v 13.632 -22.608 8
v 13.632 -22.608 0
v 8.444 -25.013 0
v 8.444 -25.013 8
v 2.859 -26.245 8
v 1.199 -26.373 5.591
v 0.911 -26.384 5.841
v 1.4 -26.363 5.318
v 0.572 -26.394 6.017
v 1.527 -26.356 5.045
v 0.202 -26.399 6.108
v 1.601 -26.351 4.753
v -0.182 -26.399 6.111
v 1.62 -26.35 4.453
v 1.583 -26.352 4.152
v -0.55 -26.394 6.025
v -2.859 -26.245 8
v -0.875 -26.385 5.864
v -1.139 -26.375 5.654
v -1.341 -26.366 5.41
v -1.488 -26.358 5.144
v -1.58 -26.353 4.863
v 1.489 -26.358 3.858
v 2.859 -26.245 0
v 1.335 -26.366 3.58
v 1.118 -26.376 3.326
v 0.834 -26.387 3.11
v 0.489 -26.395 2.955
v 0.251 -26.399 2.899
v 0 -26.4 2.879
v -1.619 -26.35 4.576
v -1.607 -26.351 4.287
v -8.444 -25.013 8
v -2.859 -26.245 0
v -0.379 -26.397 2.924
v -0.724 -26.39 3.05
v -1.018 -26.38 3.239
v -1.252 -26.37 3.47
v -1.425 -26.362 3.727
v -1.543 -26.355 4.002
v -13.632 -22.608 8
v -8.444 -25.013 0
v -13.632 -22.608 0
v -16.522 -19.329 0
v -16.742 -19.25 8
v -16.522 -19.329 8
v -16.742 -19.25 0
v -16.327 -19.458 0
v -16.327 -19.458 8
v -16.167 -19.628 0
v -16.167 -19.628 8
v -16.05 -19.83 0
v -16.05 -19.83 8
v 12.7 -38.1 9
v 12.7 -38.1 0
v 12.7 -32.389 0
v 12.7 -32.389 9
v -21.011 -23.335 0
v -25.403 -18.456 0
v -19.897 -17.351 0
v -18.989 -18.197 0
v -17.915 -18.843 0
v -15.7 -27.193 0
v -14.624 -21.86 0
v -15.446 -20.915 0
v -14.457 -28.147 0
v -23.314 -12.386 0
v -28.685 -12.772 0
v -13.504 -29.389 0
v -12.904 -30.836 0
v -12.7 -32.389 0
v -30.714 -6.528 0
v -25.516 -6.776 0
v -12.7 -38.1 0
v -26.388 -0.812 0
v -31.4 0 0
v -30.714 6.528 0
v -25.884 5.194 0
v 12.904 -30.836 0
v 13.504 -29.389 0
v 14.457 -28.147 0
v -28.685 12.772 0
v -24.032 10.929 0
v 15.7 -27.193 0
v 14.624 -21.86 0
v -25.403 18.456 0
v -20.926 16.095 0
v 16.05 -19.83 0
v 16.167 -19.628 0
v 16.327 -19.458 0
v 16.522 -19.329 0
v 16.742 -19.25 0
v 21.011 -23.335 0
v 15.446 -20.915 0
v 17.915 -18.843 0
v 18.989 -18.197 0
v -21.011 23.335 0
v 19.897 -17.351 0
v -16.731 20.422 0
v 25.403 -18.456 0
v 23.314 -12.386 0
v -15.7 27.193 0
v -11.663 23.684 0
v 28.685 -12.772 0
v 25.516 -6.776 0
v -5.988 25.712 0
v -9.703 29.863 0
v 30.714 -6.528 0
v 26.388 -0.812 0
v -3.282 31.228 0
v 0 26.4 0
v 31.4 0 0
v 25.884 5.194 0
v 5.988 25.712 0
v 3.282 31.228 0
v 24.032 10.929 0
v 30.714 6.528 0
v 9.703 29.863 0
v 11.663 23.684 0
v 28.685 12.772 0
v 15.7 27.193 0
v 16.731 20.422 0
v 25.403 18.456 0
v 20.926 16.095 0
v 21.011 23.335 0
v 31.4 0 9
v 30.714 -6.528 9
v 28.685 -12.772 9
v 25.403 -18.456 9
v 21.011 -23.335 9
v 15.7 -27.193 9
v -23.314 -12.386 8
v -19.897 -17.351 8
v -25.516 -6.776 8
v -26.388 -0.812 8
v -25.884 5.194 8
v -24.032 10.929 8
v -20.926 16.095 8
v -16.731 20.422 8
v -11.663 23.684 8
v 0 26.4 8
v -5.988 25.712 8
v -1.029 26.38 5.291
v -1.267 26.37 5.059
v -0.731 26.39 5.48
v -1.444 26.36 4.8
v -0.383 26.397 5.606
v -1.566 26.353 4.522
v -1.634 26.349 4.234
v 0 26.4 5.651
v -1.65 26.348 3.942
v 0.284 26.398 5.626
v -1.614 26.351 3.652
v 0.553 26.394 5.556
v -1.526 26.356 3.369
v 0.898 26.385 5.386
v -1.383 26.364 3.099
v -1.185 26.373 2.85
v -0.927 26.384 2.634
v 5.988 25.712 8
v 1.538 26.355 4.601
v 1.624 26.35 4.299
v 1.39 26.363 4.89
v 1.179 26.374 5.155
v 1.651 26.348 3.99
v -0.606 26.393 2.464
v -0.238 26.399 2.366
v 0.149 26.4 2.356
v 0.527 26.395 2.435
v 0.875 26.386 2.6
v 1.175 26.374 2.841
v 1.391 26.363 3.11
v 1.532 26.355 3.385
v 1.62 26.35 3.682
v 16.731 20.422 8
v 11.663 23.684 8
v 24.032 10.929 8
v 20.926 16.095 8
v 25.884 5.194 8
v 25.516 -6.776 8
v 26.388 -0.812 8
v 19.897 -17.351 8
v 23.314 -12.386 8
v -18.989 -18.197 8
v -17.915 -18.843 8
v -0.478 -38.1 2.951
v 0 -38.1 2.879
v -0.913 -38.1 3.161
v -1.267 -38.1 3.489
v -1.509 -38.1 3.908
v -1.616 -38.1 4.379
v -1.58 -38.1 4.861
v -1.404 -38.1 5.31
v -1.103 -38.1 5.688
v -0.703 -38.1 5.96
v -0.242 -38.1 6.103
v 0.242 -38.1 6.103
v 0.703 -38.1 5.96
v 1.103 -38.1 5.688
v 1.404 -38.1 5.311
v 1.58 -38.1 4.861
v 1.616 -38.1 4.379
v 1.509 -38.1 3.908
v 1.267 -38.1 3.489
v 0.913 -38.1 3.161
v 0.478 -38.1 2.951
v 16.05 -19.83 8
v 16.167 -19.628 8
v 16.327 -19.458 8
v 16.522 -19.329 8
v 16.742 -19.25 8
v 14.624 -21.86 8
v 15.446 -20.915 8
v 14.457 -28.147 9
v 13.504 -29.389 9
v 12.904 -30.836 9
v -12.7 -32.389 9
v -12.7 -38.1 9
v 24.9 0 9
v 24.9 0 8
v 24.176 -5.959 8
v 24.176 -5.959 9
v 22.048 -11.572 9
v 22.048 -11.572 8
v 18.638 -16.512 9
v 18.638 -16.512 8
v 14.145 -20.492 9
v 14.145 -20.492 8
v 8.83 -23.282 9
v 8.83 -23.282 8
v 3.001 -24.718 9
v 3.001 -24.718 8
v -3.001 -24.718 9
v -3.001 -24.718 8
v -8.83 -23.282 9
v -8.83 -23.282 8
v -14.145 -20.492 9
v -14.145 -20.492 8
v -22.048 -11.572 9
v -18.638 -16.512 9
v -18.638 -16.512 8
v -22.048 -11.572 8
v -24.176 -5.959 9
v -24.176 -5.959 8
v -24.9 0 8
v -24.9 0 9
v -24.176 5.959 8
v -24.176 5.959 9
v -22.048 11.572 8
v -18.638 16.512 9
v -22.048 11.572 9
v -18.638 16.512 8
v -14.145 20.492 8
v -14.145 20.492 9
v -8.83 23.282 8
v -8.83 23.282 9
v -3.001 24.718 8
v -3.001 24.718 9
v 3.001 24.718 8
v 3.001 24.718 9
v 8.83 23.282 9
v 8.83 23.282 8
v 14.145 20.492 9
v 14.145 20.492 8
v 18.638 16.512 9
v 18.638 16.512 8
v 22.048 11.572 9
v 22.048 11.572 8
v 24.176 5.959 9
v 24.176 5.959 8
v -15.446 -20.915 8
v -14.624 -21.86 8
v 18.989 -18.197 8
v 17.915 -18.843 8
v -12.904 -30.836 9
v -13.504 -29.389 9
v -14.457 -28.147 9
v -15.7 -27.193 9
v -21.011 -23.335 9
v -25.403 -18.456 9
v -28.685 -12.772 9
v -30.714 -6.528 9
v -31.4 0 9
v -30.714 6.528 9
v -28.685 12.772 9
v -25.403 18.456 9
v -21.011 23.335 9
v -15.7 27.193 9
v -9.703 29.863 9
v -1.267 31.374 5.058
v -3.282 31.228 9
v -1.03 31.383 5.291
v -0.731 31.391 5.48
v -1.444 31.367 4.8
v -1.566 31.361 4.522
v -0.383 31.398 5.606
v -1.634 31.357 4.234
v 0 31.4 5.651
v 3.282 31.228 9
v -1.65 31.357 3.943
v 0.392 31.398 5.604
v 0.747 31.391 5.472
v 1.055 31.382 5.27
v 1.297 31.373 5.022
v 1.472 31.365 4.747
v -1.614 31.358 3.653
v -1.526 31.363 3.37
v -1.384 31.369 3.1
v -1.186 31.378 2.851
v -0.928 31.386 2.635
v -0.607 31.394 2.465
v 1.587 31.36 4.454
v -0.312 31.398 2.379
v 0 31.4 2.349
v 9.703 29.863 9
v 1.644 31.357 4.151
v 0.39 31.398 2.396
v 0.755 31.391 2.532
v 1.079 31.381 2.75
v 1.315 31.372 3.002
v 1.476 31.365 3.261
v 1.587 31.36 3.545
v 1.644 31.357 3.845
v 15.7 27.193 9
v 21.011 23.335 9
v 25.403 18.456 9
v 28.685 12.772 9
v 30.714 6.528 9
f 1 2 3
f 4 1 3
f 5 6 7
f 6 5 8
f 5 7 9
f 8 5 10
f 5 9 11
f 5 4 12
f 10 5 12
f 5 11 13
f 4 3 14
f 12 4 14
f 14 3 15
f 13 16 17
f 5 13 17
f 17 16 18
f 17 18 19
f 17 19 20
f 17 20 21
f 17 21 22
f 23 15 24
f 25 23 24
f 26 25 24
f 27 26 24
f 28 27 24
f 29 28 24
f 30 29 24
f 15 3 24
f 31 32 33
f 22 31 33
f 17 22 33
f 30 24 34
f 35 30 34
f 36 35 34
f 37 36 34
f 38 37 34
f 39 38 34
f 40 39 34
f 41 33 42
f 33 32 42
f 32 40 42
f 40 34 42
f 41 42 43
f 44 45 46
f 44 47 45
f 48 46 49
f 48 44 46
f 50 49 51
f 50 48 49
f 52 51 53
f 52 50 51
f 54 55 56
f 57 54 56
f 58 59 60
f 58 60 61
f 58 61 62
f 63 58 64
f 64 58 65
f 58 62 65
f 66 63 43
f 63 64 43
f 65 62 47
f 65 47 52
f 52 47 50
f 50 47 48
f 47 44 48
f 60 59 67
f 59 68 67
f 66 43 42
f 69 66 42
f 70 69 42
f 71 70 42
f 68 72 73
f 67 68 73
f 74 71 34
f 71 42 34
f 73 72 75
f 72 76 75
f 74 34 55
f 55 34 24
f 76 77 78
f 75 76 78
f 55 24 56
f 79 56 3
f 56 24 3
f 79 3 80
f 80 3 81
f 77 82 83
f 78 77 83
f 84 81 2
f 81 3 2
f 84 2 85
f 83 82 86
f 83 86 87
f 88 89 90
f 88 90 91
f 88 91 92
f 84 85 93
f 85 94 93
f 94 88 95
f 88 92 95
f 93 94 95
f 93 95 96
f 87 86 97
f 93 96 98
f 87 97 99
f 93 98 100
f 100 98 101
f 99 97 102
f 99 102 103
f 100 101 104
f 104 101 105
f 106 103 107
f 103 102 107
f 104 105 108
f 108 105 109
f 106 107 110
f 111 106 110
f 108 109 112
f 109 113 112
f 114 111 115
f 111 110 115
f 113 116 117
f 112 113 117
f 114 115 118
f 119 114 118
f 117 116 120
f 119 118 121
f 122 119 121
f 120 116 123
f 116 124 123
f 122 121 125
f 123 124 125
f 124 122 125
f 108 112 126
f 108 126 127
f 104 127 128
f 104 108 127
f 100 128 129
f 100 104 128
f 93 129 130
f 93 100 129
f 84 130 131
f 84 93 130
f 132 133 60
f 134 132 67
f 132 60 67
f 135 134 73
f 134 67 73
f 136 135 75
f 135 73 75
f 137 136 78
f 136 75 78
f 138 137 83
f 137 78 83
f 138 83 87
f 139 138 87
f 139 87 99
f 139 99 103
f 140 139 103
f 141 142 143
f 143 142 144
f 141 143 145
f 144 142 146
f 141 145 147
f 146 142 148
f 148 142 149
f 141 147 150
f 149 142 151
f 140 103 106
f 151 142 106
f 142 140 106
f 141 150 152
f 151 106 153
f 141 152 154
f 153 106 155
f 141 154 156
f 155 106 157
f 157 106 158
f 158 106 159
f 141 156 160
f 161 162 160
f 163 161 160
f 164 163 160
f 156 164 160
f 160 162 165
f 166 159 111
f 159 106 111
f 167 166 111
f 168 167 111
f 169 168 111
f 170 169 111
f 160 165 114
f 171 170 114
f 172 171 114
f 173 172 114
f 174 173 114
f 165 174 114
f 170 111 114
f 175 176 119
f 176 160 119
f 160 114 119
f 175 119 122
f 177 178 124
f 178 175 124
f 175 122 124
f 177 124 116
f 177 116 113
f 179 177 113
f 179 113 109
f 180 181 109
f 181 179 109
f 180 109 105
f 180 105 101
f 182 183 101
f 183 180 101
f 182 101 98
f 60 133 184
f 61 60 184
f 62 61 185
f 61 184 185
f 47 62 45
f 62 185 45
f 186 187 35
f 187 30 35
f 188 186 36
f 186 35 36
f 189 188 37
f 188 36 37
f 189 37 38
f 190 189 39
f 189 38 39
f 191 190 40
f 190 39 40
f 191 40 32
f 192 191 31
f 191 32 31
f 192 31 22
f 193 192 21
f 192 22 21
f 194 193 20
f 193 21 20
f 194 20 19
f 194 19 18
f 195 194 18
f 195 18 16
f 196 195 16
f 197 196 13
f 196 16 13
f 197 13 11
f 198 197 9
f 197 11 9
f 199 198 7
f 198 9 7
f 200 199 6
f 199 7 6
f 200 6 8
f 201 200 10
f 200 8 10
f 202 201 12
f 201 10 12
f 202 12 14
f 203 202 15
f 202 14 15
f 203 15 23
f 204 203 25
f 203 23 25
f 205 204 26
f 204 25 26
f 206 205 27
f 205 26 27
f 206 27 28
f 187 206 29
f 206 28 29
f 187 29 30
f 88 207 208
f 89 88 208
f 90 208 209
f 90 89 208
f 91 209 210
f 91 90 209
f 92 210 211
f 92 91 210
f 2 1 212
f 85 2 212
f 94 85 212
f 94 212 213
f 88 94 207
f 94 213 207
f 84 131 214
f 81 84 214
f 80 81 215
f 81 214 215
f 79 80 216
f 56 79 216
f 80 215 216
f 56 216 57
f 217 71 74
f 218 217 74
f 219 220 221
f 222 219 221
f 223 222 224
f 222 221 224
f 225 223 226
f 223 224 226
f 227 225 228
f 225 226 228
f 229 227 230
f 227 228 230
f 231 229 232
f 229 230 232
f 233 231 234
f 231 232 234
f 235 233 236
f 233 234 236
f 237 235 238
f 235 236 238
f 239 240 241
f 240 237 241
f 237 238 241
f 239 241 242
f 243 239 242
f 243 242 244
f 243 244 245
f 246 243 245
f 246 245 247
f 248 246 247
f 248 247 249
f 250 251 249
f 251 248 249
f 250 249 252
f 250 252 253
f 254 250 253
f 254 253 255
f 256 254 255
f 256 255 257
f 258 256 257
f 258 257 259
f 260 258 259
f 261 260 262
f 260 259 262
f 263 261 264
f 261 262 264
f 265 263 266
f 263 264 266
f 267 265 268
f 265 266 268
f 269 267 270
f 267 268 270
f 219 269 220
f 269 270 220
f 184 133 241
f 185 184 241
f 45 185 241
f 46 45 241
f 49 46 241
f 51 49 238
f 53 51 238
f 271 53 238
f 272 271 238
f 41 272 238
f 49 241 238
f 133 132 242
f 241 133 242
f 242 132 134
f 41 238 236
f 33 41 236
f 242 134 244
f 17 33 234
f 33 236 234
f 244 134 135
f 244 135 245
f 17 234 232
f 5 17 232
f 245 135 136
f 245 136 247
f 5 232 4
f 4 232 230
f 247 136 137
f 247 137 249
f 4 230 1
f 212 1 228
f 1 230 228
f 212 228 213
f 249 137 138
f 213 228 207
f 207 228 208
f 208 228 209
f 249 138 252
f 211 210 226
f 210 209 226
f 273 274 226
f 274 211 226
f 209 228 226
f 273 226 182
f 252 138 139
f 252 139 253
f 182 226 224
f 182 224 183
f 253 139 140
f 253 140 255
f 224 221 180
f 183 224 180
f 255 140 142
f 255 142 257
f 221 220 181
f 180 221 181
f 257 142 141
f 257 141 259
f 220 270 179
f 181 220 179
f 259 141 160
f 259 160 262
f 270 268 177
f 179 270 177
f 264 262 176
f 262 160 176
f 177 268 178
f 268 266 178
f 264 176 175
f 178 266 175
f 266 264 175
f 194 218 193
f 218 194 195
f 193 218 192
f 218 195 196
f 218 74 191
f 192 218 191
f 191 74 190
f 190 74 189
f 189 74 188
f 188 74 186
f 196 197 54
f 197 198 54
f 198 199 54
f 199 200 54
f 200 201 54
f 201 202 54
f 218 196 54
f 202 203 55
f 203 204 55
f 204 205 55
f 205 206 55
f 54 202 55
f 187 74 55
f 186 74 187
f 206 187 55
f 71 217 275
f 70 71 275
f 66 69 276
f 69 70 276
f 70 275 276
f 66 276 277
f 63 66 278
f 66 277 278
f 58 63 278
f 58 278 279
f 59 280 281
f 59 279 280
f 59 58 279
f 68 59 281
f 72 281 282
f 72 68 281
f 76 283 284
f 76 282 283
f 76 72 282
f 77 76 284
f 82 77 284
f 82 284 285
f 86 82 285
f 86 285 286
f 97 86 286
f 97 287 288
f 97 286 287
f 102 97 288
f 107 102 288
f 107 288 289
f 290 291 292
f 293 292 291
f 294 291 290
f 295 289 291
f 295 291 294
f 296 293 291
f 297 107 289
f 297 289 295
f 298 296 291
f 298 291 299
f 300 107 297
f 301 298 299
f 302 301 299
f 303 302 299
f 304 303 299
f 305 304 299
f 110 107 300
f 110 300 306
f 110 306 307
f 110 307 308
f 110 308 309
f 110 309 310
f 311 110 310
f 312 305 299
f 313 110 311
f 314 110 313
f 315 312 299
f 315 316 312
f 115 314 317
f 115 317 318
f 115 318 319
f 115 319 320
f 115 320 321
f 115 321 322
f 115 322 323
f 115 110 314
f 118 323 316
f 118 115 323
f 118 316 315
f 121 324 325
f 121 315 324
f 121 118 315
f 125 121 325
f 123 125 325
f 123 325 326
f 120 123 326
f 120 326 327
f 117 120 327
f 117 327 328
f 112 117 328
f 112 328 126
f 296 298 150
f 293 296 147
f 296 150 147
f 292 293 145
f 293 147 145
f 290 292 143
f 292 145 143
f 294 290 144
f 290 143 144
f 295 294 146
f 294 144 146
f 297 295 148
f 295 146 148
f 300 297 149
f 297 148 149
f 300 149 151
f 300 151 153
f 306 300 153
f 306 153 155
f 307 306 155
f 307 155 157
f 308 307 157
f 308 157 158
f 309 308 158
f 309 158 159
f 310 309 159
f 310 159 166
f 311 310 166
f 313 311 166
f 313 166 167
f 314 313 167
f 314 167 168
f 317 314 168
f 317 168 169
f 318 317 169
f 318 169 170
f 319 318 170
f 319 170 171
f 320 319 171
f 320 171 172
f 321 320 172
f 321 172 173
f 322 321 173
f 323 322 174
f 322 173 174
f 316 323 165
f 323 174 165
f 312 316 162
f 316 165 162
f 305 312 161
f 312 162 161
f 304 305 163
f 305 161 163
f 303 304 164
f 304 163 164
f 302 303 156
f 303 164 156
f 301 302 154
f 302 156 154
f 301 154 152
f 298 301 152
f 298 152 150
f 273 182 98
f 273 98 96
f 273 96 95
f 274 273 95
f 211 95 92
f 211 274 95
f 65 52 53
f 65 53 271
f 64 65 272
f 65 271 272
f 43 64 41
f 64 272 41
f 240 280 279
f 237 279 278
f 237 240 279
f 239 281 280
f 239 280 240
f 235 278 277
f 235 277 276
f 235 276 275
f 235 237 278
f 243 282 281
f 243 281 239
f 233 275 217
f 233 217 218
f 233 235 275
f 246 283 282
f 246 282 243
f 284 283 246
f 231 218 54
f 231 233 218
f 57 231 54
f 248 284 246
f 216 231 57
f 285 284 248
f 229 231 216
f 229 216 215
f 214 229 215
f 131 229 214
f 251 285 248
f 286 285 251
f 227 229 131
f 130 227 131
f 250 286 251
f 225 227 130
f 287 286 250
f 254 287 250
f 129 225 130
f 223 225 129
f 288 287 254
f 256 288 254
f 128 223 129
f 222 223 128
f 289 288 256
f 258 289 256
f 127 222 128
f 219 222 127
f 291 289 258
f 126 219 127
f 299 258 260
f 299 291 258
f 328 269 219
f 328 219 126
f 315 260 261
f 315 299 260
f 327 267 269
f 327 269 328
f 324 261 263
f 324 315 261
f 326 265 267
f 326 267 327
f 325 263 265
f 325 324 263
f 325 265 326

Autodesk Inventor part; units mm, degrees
ref_plane "YZ Plane" through (0, 0, 0) normal (1, 0, 0) x (0, 1, 0)
ref_plane "XY Plane" through (0, 0, 0) normal (0, 0, 1) x (1, 0, 0)
sketch "Sketch1" plane through (0, 0, 0) normal (0, 0, 1) x (1, 0, 0)
  circle A0 centre (0, 0) radius 25.4 construction
  circle A1 centre (0, 0) radius 26.4
  circle A2 centre (0, 0) radius 31.4
  line L0 (0, 0) -> (37.8275, -45.0811) construction
  line L1 (0, 0) -> (58.8492, 0) construction
  circle A3 centre (16.9696, -20.2236) radius 1
  line L2 (0, 0) -> (0, -31.4) construction
  circle A4 centre (-16.9696, -20.2236) radius 1
  dimension "d1" = 52.8
  dimension "d2" = 62.8
  dimension "d0" = 50.8
  dimension "d4" = 50
extrude "Extrusion1" add sketch "Sketch1" along normal blind 8 contours A4 A1 | A1 A4 | A3 A1 | A1 A3 | A2
fillet "Fillet1" radius 6 2 edges at (17.7233, -19.5664, 4) (16.1915, -20.8517, 4)
fillet_without_effect "Fillet2"
fillet "Fillet3" radius 6 2 edges at (-17.7233, -19.5664, 4) (-16.1915, -20.8517, 4)
fillet_without_effect "Fillet4"
sketch "Sketch2" plane through (0, 0, 8) normal (0, 0, 1) x (1, 0, 0)
  circle A0 centre (0, 0) radius 31.4 projected
  arc A1 (19.8973, -17.351) -> (-19.8973, -17.351) centre (0, 0) ccw projected
  circle A2 centre (0, 0) radius 24.9
  circle A3 centre (0, 0) radius 31.4
  dimension "d11" = 49.8
extrude "Extrusion2" add sketch "Sketch2" along normal blind 1
ref_plane "Work Plane1" through (0, 31.4, 0) normal (0, 1, 0) x (-1, 0, 0)
sketch "Sketch3" plane through (0, 31.4, 0) normal (0, 1, 0) x (-1, 0, 0)
  line L0 (-31.4, 0) -> (31.4, 0) projected
  point P0 (0, 0)
  point P1 (0, 4)
  dimension "d14" = 4
hole "Hole1" at (0, 31.4, 4) direction (0, -1, 0) diameter 3.302 depth 12.3 tip angle 118 thread size "8-32 UNC" class "2B" standard "ANSI Unified Screw Threads"
sketch "Sketch4" plane through (0, 0, 0) normal (0, 0, -1) x (-1, 0, 0)
  circle A0 centre (0, 0) radius 31.4 projected
  arc A1 (-13.6322, -22.608) -> (13.6322, -22.608) centre (0, 0) ccw projected
  line L0 (-44.084, -38.1) -> (62.353, -38.1) construction
  line L1 (-12.7, -28.7171) -> (12.7, -28.7171)
  line L2 (12.7, -28.7171) -> (12.7, -38.1)
  line L3 (12.7, -38.1) -> (-12.7, -38.1)
  line L4 (-12.7, -38.1) -> (-12.7, -28.7171)
  line L5 (-12.7, -28.7171) -> (12.7, -38.1) construction
  line L6 (12.7, -28.7171) -> (-12.7, -38.1) construction
  line L7 (0, 0) -> (0, -74.2634) construction
  point P0 (0, -33.4085)
  point P1 (0, -33.4085)
  dimension "d22" = 38.1
  dimension "d23" = 25.4
extrude "Extrusion3" add sketch "Sketch4" against normal blind 9 contours L1 A0 | A0 L2 L3 L4 picked at (-2.1634, -29.3854)
fillet "Fillet5" radius 6 1 edges at (12.7, -28.7171, 4.5)
fillet "Fillet6" radius 6 1 edges at (-12.7, -28.7171, 4.5)
sketch "Sketch5" plane through (-12.7, -38.1, 0) normal (0, -1, 0) x (1, 0, 0)
  line L0 (0, 9) -> (25.4, 9) projected
  line L1 (0, 0) -> (0, 9) projected
  line L2 (12.7, 0) -> (12.7, 9) construction
  line L3 (25.4, 9) -> (25.4, 0) construction
  line L4 (25.4, 4.5) -> (0, 4.5) construction
  point P0 (12.7, 4.5)
hole "Hole2" at (0, -38.1, 4.5) direction (0, 1, 0) diameter 3.242 depth 13 tip angle 118 thread size "M4x0.7" class "6H" standard "ANSI Metric M Profile"
equation "\"d14\" = 0.5 * d5"
equation "\"d5\" = 8"
properties part number "BSholder"
